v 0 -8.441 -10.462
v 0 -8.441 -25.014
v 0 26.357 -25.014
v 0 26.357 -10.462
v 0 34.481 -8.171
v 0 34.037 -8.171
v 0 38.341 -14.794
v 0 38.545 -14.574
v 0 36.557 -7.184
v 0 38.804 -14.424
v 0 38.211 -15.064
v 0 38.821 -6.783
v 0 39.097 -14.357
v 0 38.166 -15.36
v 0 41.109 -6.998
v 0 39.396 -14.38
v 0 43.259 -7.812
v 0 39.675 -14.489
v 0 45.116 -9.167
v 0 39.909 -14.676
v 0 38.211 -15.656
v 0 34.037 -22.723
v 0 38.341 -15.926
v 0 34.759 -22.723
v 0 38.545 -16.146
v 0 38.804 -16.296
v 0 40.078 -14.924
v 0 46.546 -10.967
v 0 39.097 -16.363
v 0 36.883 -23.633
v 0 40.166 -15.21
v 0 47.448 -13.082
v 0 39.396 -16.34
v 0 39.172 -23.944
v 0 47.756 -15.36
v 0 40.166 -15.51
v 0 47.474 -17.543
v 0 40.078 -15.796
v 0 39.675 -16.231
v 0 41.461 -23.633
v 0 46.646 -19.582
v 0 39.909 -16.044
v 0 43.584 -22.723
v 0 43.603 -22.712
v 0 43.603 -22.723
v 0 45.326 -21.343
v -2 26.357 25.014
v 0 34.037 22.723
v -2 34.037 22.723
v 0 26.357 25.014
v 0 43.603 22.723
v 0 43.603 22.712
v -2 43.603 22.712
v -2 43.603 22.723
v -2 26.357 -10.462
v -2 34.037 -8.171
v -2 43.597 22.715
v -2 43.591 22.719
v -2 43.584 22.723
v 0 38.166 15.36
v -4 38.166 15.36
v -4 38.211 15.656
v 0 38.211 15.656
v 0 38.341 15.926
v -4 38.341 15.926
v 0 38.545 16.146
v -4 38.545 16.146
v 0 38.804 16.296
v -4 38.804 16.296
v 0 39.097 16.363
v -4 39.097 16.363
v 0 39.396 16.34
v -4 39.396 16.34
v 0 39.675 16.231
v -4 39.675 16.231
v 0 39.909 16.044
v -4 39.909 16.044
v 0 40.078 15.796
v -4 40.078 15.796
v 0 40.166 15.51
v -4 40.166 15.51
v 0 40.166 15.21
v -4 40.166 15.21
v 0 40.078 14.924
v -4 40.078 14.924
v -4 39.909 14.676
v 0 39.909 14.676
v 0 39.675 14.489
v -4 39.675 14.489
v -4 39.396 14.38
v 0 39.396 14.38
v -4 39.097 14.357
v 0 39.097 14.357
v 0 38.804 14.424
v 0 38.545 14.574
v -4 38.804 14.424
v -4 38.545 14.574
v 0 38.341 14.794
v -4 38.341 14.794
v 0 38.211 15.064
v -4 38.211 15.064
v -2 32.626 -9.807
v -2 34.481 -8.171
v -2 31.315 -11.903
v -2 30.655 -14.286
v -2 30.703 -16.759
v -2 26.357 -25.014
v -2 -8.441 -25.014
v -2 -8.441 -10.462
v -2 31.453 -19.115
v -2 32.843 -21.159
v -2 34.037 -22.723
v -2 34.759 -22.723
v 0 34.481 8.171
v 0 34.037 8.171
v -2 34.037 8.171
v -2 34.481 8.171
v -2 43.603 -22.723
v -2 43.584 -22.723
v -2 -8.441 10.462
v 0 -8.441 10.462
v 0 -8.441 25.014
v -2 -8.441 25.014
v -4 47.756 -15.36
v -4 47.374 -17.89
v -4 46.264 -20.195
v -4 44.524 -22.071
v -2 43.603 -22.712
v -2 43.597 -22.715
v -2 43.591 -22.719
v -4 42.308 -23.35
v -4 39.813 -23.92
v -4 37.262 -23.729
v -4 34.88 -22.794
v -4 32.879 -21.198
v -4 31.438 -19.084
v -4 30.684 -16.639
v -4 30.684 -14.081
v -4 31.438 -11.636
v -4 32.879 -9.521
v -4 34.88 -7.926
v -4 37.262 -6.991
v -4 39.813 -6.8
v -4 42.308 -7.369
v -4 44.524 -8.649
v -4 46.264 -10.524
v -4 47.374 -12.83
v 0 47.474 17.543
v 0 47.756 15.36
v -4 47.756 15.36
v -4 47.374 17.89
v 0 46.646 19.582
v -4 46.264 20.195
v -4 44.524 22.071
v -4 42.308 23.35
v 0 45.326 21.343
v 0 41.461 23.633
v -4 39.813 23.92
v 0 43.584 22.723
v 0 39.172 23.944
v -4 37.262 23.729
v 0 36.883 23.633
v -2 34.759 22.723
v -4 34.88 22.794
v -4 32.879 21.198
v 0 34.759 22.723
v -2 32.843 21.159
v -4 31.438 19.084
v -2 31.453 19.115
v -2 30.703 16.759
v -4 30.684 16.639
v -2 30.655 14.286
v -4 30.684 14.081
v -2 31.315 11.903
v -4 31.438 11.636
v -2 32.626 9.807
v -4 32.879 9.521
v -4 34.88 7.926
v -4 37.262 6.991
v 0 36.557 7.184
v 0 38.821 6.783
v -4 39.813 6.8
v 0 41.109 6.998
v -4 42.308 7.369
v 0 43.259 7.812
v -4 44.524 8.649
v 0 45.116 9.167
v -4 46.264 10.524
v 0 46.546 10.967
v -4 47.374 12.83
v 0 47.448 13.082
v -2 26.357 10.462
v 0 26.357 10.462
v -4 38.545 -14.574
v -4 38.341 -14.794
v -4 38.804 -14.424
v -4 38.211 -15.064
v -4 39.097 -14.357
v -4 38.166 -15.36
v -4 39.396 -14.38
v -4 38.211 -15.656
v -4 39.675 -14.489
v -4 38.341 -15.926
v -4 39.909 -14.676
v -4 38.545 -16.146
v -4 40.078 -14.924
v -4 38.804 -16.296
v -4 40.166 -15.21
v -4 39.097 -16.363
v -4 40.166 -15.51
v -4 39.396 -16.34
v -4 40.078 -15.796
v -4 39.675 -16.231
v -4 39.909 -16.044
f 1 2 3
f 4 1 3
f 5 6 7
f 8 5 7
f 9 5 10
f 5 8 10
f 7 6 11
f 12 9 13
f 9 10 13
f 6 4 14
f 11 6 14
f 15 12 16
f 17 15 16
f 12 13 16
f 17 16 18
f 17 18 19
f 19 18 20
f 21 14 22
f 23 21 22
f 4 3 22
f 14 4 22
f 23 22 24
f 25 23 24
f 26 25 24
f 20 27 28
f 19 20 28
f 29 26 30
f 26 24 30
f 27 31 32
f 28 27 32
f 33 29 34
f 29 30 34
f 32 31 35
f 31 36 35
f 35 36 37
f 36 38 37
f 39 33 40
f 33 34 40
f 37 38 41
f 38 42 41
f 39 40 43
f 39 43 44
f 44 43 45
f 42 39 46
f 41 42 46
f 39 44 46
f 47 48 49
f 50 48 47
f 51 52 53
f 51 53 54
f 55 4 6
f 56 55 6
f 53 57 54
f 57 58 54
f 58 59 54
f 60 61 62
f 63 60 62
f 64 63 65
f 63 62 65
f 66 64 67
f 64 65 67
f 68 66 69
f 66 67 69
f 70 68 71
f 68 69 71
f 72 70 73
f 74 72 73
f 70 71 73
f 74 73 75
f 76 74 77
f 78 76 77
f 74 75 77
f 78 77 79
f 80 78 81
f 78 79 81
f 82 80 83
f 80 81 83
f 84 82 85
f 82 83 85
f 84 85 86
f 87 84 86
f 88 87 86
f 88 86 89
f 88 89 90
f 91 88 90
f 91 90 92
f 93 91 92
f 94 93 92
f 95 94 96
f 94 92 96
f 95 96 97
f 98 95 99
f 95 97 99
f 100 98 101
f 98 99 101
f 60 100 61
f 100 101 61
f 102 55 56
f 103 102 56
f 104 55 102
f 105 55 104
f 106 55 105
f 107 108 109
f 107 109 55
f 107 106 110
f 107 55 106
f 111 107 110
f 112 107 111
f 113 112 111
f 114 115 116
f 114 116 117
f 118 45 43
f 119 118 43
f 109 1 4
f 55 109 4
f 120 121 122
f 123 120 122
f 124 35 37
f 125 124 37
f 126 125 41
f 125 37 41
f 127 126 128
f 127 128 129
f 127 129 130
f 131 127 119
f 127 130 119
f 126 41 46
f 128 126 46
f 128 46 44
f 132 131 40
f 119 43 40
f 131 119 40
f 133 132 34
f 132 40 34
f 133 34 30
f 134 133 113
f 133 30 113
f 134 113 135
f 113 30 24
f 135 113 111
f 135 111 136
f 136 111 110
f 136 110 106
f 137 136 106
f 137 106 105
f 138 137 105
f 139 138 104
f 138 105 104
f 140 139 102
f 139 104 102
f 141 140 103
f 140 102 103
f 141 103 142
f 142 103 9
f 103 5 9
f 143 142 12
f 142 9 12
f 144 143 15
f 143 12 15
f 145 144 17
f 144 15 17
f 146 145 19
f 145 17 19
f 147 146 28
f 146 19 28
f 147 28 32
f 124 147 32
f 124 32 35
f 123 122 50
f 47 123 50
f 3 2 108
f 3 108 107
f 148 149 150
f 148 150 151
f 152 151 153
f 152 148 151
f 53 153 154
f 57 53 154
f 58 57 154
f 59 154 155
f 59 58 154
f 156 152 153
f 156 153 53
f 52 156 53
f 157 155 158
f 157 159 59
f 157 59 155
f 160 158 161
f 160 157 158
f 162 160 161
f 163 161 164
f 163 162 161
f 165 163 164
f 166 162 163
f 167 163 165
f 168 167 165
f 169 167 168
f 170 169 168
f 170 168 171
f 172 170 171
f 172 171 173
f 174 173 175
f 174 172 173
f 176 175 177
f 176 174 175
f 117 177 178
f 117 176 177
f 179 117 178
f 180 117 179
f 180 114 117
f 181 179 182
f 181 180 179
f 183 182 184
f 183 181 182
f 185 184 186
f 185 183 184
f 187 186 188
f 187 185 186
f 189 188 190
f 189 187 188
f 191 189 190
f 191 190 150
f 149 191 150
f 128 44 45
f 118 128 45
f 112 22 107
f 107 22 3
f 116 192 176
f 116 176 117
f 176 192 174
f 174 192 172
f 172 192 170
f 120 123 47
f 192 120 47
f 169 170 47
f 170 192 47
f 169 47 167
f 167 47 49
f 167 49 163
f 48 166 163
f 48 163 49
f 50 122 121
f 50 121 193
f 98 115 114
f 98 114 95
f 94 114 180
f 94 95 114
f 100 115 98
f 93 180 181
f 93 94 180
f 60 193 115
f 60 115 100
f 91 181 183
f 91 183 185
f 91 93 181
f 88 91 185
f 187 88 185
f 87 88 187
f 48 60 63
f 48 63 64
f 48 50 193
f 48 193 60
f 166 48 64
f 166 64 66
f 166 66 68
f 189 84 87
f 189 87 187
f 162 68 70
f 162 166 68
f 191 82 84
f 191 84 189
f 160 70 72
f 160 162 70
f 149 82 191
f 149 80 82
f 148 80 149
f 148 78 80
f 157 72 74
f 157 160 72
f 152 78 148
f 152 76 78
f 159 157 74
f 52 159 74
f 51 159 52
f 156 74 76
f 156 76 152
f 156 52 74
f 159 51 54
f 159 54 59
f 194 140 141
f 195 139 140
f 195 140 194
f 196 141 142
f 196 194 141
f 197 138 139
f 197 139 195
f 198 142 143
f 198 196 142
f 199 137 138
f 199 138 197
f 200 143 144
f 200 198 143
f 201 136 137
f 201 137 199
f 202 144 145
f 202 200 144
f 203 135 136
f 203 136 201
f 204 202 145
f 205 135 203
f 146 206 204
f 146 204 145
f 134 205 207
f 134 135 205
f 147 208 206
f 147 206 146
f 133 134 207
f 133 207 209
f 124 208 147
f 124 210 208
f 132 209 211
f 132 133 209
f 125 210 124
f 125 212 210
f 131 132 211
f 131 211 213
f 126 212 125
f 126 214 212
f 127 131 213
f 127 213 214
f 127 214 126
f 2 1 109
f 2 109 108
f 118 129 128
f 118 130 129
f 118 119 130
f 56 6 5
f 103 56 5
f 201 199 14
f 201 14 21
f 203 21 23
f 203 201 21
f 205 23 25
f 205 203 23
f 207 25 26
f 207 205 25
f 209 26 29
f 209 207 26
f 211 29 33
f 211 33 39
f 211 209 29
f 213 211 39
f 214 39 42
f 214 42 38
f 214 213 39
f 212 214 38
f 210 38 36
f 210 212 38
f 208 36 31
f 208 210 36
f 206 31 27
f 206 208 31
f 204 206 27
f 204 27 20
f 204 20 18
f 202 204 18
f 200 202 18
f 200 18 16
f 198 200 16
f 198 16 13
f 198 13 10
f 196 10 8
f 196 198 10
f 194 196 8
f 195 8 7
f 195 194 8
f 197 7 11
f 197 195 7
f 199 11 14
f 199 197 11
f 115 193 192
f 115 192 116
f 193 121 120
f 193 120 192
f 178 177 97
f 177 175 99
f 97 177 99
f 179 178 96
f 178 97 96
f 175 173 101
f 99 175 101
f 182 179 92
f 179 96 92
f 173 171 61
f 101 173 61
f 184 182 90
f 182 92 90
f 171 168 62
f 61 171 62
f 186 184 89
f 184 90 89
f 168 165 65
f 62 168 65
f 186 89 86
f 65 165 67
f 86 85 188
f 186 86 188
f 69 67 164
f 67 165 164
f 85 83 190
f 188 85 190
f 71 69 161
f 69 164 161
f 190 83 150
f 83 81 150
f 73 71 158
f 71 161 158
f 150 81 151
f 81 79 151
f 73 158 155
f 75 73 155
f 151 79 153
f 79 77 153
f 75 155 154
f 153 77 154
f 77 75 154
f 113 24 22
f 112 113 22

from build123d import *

# Parameters (mm, degrees)
F0_W     = 34.7978491336
F0_H     = 14.5514970645
F1_DEPTH = 2
F2_DEPTH = 2
F3_R     = 8.5838279675
F4_DEPTH = 4
F5_R     = 1.0054501638
F6_DEPTH = 4


with BuildPart() as f1:
    # F0 (on Right) → F1 (new body)
    with BuildSketch(Plane.YZ):
        with Locations((8.9581357315, 17.7379124798)):
            Rectangle(F0_W, F0_H)
    extrude(amount=-F1_DEPTH)

    # F0 (on Right) → F2 (join)
    with BuildSketch(Plane.YZ):
        with Locations((8.9581357315, 17.7379124798)):
            Rectangle(F0_W, F0_H)
        Polygon((34.0367630124, 22.722741589), (26.3570602983, 25.0136610121), (26.3570602983, 10.4621639475), (34.0367630124, 8.1712445244), (43.6027087271, 8.1712445244), (43.6027087271, 22.722741589), align=None)
    extrude(amount=-F2_DEPTH)

    # F3 (on Right) → F4 (join)
    with BuildSketch(Plane.YZ):
        with Locations((39.1718298197, 15.359907411)):
            Circle(F3_R)
    extrude(amount=-F4_DEPTH)

    # F5 (on face) → F6 (cut)
    with BuildSketch(Plane(origin=(-4, 0, 0), x_dir=(0, -1, 0), z_dir=(-1, 0, 0))):
        with Locations((-39.1718298197, 15.359907411)):
            Circle(F5_R)
    extrude(amount=-F6_DEPTH, mode=Mode.SUBTRACT)


with BuildPart() as f7_1:
    # F7: instance of F1
    add(f1.part.mirror(Plane.XY))


solid = Compound([f1.part, f7_1.part])
